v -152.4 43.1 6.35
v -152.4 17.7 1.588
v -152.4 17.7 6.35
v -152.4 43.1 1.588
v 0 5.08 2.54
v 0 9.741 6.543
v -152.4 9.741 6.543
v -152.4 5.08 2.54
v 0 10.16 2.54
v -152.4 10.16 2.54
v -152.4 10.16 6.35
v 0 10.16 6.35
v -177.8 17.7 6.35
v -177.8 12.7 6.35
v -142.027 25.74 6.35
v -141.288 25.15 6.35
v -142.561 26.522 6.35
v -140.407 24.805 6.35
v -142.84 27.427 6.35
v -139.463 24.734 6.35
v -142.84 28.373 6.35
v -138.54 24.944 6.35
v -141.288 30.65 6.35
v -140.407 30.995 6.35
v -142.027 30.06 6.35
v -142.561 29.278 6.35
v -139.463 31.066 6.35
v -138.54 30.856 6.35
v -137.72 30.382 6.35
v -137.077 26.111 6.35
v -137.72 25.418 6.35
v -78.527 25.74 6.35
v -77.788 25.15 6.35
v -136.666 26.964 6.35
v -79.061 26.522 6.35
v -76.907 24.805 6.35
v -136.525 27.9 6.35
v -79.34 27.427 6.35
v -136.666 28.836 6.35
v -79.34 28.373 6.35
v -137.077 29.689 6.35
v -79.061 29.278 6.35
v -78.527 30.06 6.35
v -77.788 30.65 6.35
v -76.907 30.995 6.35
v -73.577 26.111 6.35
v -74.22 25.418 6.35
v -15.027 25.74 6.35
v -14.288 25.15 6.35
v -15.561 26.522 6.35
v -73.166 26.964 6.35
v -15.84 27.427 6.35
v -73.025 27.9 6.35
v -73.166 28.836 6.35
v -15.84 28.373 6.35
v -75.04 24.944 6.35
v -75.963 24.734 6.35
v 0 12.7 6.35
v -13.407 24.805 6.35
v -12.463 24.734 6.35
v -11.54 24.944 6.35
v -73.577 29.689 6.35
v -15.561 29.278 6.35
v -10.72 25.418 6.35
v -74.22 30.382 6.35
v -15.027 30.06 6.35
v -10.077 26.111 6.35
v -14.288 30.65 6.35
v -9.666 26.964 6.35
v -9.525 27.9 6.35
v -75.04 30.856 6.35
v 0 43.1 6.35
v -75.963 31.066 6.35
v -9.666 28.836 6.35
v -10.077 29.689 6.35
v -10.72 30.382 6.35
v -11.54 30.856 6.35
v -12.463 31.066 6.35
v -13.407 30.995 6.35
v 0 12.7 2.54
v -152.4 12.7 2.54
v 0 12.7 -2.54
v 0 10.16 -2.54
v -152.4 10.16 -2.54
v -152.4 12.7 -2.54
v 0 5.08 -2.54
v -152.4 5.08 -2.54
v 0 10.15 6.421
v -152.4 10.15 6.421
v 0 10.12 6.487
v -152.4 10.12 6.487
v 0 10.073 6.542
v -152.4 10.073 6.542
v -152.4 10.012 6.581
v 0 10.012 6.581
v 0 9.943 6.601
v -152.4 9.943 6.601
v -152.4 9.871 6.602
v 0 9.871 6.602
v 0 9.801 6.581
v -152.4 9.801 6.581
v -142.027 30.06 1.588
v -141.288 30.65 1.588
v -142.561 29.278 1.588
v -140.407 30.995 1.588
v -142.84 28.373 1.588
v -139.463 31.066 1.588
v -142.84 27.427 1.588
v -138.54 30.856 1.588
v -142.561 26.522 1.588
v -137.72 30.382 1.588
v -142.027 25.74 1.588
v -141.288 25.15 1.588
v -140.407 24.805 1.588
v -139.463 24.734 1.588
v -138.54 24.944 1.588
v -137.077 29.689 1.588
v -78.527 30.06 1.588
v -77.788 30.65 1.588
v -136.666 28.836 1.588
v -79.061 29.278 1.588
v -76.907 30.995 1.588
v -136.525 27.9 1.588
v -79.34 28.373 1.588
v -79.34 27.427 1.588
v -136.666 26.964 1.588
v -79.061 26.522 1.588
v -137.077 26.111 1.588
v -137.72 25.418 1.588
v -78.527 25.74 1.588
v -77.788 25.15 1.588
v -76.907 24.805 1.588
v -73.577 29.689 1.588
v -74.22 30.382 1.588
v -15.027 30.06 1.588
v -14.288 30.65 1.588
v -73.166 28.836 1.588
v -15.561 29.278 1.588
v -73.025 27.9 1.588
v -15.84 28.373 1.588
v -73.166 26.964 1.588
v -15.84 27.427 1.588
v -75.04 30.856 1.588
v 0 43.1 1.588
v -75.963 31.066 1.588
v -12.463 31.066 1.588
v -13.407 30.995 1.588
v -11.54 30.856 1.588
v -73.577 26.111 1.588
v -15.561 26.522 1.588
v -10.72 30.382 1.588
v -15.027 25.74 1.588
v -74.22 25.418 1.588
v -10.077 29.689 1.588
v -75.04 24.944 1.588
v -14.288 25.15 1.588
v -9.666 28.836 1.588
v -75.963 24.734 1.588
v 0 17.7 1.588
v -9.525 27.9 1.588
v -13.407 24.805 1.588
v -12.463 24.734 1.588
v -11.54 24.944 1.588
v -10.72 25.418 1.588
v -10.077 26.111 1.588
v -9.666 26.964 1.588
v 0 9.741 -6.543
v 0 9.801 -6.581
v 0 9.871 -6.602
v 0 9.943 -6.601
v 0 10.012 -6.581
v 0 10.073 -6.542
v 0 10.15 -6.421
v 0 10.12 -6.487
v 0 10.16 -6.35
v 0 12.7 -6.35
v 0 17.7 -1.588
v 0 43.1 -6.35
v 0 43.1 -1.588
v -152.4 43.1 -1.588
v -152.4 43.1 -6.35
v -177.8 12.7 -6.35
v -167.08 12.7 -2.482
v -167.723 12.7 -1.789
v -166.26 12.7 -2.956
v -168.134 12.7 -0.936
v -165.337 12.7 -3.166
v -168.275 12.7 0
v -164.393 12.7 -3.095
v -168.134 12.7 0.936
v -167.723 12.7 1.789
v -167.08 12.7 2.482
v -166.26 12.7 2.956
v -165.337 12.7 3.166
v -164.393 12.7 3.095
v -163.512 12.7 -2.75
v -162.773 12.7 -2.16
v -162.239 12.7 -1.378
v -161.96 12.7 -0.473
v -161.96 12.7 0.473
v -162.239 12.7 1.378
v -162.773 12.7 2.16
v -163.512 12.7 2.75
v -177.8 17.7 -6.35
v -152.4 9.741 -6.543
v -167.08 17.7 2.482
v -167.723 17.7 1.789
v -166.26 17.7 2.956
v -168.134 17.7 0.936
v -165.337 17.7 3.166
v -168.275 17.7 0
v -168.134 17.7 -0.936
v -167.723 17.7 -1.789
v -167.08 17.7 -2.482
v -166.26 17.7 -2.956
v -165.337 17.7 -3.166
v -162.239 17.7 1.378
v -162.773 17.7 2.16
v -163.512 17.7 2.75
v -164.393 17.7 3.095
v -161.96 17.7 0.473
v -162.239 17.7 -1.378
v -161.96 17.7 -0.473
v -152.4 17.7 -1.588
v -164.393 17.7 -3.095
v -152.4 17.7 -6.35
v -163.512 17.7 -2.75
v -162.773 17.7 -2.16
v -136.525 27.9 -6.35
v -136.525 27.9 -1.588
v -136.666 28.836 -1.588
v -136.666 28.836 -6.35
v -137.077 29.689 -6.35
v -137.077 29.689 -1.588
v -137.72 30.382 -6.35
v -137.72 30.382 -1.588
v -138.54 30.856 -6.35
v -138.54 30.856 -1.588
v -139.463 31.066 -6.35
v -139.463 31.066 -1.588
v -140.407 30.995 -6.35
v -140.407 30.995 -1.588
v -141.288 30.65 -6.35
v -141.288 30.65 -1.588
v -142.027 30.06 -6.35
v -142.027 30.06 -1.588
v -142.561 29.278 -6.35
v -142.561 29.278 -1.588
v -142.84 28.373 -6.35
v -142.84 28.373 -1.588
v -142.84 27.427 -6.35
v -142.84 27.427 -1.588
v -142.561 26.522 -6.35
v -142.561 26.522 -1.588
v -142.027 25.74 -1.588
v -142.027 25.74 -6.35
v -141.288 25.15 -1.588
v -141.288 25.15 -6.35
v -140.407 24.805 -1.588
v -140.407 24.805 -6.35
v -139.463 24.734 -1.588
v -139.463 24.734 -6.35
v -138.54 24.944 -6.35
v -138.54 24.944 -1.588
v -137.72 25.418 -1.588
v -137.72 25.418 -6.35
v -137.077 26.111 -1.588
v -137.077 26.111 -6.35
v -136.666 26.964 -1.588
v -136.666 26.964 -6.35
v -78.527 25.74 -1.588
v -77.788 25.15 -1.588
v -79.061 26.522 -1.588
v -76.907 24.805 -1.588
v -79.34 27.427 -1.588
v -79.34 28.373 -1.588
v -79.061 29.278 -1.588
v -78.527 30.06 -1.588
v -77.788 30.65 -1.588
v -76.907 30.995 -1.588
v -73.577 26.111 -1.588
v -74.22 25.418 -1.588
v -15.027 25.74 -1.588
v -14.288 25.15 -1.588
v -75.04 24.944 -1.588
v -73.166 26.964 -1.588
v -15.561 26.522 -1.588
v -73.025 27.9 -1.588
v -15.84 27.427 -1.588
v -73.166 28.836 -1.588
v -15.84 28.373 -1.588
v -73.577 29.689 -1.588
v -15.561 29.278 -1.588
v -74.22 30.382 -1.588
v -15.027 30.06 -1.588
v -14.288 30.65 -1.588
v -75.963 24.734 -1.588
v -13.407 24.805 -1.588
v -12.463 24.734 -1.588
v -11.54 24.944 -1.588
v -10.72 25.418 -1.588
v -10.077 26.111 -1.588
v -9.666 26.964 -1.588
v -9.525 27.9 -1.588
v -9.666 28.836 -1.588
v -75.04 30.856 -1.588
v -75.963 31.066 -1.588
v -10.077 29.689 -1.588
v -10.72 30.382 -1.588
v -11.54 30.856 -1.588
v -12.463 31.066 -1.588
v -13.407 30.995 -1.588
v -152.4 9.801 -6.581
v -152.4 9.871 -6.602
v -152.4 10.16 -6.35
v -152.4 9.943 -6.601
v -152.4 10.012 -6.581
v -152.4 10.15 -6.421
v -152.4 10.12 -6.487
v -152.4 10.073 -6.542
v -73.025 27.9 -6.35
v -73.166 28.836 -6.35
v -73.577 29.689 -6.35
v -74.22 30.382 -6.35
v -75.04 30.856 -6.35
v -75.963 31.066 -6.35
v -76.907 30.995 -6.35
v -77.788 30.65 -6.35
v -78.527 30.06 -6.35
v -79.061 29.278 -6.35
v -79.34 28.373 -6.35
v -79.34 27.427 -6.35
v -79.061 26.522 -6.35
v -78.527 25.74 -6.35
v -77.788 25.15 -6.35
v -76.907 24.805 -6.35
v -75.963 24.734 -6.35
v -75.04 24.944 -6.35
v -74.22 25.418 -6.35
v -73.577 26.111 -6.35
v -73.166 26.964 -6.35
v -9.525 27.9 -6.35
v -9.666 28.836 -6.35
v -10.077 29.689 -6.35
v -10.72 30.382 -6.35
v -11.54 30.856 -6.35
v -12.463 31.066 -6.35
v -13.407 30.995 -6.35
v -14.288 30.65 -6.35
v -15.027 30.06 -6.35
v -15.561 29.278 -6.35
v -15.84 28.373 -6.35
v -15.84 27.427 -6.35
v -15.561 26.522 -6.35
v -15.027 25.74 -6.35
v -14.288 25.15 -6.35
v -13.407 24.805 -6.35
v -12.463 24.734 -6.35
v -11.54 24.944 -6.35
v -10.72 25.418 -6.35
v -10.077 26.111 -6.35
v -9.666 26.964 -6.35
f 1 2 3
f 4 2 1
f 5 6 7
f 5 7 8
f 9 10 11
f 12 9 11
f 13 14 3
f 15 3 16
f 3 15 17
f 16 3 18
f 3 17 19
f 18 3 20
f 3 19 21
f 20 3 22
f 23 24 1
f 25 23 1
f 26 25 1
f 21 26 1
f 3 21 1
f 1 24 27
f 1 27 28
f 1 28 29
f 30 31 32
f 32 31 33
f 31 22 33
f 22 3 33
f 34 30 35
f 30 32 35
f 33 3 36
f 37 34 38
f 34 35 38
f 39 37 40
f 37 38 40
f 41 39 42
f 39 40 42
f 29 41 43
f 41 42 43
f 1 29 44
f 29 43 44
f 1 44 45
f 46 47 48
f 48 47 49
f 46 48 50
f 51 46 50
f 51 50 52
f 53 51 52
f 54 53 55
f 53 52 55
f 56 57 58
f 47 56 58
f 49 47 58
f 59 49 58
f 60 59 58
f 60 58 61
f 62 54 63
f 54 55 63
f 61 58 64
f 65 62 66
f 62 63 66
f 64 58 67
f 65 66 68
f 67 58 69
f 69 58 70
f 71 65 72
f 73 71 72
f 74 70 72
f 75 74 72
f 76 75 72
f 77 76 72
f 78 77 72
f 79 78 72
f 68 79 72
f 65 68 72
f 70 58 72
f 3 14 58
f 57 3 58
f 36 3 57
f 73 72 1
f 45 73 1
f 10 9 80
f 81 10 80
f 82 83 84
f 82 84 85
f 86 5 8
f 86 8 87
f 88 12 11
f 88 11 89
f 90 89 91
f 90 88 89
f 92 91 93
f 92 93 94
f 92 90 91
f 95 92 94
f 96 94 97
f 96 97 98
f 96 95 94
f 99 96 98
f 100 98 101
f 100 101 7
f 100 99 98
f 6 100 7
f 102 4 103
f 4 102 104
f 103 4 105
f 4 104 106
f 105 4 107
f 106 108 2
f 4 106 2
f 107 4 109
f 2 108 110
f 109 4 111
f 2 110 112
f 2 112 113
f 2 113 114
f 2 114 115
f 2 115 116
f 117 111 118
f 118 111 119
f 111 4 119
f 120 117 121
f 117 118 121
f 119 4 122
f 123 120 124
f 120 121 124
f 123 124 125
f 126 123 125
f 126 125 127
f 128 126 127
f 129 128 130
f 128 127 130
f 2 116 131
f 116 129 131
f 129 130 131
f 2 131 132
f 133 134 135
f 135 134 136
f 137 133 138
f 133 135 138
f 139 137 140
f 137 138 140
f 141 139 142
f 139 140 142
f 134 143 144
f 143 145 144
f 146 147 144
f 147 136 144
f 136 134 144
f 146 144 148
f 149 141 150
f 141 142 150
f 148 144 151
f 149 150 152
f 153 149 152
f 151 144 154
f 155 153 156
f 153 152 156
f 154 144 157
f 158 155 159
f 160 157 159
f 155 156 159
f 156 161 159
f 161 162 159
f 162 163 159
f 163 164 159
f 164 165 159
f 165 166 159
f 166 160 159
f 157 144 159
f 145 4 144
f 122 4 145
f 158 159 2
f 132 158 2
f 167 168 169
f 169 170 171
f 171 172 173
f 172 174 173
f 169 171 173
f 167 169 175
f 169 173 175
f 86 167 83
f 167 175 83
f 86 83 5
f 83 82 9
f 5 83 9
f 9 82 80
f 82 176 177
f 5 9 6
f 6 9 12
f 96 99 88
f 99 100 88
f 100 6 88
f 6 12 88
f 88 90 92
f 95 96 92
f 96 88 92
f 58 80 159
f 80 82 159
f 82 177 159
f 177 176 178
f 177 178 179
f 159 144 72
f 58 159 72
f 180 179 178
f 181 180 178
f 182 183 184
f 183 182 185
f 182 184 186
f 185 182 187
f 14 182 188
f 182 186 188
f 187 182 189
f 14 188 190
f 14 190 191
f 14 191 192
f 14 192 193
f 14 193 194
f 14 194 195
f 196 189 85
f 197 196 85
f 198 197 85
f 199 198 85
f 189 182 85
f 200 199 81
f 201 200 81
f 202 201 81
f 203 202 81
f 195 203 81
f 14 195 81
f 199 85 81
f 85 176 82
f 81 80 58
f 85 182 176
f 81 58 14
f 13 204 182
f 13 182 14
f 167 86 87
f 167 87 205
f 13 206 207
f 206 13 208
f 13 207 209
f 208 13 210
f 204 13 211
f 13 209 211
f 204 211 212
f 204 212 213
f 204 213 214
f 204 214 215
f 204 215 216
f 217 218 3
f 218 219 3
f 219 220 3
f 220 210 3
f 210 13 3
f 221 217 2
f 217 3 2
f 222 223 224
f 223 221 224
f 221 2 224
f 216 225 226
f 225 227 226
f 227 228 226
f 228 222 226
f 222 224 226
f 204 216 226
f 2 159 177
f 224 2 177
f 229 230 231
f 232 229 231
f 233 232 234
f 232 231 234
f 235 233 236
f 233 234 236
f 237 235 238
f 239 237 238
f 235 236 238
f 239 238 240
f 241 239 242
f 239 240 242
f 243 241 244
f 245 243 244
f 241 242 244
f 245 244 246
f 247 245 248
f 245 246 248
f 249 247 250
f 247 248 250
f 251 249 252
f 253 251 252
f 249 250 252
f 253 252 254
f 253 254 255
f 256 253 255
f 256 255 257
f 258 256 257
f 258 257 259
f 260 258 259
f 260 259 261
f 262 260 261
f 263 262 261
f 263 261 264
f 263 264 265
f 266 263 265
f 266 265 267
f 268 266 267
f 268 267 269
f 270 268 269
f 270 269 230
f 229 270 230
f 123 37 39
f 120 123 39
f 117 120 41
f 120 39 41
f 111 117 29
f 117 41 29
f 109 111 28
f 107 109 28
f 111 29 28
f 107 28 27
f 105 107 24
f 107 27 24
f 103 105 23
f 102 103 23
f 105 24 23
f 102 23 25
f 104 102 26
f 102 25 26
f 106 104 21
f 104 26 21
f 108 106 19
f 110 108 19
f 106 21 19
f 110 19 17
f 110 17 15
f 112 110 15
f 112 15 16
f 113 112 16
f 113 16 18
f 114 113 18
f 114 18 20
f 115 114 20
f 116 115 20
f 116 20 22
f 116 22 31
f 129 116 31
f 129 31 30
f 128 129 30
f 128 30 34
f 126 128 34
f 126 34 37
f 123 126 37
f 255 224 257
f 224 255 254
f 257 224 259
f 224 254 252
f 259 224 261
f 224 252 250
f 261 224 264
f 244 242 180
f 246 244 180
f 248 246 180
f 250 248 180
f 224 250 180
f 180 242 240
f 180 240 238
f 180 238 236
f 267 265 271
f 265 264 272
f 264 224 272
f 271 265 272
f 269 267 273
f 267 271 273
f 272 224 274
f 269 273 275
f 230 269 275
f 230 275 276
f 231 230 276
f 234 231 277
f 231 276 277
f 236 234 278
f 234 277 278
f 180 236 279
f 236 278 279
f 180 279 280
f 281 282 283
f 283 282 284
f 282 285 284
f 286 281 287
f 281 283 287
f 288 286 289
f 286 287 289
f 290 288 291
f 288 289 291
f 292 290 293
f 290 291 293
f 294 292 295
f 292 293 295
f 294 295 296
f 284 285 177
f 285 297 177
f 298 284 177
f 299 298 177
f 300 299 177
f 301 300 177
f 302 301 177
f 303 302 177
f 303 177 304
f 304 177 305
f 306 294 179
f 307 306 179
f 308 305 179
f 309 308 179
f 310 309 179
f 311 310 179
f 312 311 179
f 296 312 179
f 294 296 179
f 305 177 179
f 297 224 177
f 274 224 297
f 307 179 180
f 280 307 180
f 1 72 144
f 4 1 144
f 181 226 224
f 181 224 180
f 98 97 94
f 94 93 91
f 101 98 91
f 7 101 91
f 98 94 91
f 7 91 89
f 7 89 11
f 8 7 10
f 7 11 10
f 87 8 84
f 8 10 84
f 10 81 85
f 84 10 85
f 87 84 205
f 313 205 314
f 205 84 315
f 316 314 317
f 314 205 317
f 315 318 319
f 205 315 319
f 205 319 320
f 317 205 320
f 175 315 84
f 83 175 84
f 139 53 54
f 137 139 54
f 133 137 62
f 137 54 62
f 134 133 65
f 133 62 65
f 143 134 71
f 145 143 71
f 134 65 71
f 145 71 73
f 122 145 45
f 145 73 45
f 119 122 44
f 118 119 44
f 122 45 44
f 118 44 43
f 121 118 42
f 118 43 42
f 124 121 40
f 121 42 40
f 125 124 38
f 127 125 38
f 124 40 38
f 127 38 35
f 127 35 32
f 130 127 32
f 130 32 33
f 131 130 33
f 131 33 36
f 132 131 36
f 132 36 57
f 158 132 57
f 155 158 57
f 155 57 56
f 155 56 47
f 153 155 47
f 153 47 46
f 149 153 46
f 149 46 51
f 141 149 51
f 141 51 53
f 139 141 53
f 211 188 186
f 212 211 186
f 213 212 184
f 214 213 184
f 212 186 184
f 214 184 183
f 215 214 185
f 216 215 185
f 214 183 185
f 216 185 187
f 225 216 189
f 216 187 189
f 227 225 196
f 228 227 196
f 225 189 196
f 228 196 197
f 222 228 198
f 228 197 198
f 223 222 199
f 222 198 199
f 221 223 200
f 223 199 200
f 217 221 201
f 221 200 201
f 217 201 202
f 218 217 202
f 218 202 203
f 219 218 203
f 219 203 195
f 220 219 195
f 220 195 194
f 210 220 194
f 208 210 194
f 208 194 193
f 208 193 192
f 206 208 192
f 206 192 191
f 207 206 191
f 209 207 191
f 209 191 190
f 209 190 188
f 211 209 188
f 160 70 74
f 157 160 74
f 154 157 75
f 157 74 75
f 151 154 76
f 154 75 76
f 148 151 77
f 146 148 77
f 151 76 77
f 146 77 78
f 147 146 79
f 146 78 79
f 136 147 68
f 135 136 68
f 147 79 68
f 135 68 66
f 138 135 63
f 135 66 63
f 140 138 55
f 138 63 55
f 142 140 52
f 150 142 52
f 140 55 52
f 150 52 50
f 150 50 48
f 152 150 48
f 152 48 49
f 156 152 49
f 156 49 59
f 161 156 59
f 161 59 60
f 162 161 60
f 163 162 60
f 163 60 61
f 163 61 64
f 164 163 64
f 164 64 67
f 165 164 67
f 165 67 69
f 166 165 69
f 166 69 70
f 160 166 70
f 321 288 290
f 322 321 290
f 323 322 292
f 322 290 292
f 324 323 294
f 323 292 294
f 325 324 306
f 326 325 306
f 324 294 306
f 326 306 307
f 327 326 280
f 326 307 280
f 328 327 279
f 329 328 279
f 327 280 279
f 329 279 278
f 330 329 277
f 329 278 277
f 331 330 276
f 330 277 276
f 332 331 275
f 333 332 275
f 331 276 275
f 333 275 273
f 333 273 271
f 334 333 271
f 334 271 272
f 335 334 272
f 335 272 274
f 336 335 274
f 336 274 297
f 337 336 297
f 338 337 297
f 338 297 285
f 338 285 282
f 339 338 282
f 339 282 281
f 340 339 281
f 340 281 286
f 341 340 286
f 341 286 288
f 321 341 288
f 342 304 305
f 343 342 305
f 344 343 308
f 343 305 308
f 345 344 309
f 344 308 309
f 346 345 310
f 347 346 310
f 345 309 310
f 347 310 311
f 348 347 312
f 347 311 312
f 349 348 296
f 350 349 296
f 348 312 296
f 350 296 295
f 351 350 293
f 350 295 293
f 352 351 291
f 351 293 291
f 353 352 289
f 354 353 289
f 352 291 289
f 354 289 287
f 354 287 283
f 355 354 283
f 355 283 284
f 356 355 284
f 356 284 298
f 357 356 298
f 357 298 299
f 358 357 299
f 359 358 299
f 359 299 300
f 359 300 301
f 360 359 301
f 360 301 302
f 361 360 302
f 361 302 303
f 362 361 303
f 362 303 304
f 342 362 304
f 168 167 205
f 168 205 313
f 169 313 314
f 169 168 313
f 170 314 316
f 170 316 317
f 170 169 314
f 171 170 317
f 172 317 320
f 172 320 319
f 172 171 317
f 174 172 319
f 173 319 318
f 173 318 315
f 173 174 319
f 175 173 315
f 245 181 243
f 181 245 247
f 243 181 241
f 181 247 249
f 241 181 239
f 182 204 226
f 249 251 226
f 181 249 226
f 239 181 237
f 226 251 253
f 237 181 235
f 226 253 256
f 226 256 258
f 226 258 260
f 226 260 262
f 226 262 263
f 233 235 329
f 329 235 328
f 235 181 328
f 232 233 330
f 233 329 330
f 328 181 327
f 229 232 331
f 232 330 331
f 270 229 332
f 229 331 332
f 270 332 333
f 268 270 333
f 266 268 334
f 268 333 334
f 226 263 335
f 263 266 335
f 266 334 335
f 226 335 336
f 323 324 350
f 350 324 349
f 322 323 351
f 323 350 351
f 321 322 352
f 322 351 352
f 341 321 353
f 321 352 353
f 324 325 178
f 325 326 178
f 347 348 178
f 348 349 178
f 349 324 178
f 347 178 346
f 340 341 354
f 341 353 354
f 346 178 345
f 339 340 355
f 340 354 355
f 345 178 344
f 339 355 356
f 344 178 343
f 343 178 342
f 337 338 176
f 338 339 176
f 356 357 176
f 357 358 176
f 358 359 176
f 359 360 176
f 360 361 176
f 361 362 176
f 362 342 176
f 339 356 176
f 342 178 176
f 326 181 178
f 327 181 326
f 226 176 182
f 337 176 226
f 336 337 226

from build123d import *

# Parameters (mm, degrees)
SKETCH10_W                  = 2.54
SKETCH10_H                  = 2.54
BOSS_EXTRUDE3_DEPTH         = 152.4
BOSS_EXTRUDE4_DEPTH         = 177.8
SKETCH14_W                  = 25.4
SKETCH14_H                  = 25.4
CUT_EXTRUDE1_DEPTH          = 184.407350223
F_1_4_0_25_DIAMETER_HOLE1_D = 6.35
F_1_4_0_25_DIAMETER_HOLE2_D = 6.35


with BuildPart() as part:
    # Sketch10 → Boss-Extrude3 (new body)
    with BuildSketch(Plane(origin=(0, 0, 0), x_dir=(0, 0, -1), z_dir=(1, 0, 0))):
        with BuildLine():
            Line((-2.54, 5.08), (0, 5.08))
            Line((0, 5.08), (0, 10.16))
            Line((0, 10.16), (-2.54, 10.16))
            Line((-2.54, 10.16), (-6.35, 10.16))
            ThreePointArc((-6.35, 10.16), (-6.580814495, 10.012022021), (-6.542688341, 9.740509205))
            Line((-6.542688341, 9.740509205), (-2.54, 5.08))
        make_face()
        with Locations((-1.27, 11.43)):
            Rectangle(SKETCH10_W, SKETCH10_H)
        with BuildLine():
            Line((0, 10.16), (0, 5.08))
            Line((0, 5.08), (2.54, 5.08))
            Line((2.54, 5.08), (6.542688341, 9.740509205))
            ThreePointArc((6.542688341, 9.740509205), (6.580814495, 10.012022021), (6.35, 10.16))
            Line((6.35, 10.16), (2.54, 10.16))
            Line((2.54, 10.16), (0, 10.16))
        make_face()
        with Locations((1.27, 11.43)):
            Rectangle(SKETCH10_W, SKETCH10_H)
    extrude(amount=-BOSS_EXTRUDE3_DEPTH)

    # Sketch11 → Boss-Extrude4 (add)
    with BuildSketch(Plane(origin=(0, 0, 0), x_dir=(0, 0, -1), z_dir=(1, 0, 0))):
        Polygon((6.35, 12.7), (-6.35, 12.7), (-6.35, 43.1), (-1.5875, 43.1), (-1.5875, 17.7), (1.5875, 17.7), (1.5875, 43.1), (6.35, 43.1), align=None)
    extrude(amount=-BOSS_EXTRUDE4_DEPTH)

    # Sketch14 → Cut-Extrude1 (cut, through all)
    with BuildSketch(Plane(origin=(0, 0, -6.35), x_dir=(-1, 0, 0), z_dir=(0, 0, -1))):
        with Locations((165.1, 30.4)):
            Rectangle(SKETCH14_W, SKETCH14_H)
    extrude(amount=-CUT_EXTRUDE1_DEPTH, mode=Mode.SUBTRACT)

    # 1/4 (0.25) Diameter Hole1 (through all)
    with Locations(Plane(origin=(0, 0, -6.35), x_dir=(-1, 0, 0), z_dir=(0, 0, -1))):
        with Locations((139.7, 27.9), (12.7, 27.9), (76.2, 27.9)):
            Hole(F_1_4_0_25_DIAMETER_HOLE1_D / 2)

    # 1/4 (0.25) Diameter Hole2 (through all)
    with Locations(Plane(origin=(0, 17.7, 0), x_dir=(1, 0, 0), z_dir=(0, 1, 0))):
        with Locations((-165.1, 0)):
            Hole(F_1_4_0_25_DIAMETER_HOLE2_D / 2)


solid = part.part
